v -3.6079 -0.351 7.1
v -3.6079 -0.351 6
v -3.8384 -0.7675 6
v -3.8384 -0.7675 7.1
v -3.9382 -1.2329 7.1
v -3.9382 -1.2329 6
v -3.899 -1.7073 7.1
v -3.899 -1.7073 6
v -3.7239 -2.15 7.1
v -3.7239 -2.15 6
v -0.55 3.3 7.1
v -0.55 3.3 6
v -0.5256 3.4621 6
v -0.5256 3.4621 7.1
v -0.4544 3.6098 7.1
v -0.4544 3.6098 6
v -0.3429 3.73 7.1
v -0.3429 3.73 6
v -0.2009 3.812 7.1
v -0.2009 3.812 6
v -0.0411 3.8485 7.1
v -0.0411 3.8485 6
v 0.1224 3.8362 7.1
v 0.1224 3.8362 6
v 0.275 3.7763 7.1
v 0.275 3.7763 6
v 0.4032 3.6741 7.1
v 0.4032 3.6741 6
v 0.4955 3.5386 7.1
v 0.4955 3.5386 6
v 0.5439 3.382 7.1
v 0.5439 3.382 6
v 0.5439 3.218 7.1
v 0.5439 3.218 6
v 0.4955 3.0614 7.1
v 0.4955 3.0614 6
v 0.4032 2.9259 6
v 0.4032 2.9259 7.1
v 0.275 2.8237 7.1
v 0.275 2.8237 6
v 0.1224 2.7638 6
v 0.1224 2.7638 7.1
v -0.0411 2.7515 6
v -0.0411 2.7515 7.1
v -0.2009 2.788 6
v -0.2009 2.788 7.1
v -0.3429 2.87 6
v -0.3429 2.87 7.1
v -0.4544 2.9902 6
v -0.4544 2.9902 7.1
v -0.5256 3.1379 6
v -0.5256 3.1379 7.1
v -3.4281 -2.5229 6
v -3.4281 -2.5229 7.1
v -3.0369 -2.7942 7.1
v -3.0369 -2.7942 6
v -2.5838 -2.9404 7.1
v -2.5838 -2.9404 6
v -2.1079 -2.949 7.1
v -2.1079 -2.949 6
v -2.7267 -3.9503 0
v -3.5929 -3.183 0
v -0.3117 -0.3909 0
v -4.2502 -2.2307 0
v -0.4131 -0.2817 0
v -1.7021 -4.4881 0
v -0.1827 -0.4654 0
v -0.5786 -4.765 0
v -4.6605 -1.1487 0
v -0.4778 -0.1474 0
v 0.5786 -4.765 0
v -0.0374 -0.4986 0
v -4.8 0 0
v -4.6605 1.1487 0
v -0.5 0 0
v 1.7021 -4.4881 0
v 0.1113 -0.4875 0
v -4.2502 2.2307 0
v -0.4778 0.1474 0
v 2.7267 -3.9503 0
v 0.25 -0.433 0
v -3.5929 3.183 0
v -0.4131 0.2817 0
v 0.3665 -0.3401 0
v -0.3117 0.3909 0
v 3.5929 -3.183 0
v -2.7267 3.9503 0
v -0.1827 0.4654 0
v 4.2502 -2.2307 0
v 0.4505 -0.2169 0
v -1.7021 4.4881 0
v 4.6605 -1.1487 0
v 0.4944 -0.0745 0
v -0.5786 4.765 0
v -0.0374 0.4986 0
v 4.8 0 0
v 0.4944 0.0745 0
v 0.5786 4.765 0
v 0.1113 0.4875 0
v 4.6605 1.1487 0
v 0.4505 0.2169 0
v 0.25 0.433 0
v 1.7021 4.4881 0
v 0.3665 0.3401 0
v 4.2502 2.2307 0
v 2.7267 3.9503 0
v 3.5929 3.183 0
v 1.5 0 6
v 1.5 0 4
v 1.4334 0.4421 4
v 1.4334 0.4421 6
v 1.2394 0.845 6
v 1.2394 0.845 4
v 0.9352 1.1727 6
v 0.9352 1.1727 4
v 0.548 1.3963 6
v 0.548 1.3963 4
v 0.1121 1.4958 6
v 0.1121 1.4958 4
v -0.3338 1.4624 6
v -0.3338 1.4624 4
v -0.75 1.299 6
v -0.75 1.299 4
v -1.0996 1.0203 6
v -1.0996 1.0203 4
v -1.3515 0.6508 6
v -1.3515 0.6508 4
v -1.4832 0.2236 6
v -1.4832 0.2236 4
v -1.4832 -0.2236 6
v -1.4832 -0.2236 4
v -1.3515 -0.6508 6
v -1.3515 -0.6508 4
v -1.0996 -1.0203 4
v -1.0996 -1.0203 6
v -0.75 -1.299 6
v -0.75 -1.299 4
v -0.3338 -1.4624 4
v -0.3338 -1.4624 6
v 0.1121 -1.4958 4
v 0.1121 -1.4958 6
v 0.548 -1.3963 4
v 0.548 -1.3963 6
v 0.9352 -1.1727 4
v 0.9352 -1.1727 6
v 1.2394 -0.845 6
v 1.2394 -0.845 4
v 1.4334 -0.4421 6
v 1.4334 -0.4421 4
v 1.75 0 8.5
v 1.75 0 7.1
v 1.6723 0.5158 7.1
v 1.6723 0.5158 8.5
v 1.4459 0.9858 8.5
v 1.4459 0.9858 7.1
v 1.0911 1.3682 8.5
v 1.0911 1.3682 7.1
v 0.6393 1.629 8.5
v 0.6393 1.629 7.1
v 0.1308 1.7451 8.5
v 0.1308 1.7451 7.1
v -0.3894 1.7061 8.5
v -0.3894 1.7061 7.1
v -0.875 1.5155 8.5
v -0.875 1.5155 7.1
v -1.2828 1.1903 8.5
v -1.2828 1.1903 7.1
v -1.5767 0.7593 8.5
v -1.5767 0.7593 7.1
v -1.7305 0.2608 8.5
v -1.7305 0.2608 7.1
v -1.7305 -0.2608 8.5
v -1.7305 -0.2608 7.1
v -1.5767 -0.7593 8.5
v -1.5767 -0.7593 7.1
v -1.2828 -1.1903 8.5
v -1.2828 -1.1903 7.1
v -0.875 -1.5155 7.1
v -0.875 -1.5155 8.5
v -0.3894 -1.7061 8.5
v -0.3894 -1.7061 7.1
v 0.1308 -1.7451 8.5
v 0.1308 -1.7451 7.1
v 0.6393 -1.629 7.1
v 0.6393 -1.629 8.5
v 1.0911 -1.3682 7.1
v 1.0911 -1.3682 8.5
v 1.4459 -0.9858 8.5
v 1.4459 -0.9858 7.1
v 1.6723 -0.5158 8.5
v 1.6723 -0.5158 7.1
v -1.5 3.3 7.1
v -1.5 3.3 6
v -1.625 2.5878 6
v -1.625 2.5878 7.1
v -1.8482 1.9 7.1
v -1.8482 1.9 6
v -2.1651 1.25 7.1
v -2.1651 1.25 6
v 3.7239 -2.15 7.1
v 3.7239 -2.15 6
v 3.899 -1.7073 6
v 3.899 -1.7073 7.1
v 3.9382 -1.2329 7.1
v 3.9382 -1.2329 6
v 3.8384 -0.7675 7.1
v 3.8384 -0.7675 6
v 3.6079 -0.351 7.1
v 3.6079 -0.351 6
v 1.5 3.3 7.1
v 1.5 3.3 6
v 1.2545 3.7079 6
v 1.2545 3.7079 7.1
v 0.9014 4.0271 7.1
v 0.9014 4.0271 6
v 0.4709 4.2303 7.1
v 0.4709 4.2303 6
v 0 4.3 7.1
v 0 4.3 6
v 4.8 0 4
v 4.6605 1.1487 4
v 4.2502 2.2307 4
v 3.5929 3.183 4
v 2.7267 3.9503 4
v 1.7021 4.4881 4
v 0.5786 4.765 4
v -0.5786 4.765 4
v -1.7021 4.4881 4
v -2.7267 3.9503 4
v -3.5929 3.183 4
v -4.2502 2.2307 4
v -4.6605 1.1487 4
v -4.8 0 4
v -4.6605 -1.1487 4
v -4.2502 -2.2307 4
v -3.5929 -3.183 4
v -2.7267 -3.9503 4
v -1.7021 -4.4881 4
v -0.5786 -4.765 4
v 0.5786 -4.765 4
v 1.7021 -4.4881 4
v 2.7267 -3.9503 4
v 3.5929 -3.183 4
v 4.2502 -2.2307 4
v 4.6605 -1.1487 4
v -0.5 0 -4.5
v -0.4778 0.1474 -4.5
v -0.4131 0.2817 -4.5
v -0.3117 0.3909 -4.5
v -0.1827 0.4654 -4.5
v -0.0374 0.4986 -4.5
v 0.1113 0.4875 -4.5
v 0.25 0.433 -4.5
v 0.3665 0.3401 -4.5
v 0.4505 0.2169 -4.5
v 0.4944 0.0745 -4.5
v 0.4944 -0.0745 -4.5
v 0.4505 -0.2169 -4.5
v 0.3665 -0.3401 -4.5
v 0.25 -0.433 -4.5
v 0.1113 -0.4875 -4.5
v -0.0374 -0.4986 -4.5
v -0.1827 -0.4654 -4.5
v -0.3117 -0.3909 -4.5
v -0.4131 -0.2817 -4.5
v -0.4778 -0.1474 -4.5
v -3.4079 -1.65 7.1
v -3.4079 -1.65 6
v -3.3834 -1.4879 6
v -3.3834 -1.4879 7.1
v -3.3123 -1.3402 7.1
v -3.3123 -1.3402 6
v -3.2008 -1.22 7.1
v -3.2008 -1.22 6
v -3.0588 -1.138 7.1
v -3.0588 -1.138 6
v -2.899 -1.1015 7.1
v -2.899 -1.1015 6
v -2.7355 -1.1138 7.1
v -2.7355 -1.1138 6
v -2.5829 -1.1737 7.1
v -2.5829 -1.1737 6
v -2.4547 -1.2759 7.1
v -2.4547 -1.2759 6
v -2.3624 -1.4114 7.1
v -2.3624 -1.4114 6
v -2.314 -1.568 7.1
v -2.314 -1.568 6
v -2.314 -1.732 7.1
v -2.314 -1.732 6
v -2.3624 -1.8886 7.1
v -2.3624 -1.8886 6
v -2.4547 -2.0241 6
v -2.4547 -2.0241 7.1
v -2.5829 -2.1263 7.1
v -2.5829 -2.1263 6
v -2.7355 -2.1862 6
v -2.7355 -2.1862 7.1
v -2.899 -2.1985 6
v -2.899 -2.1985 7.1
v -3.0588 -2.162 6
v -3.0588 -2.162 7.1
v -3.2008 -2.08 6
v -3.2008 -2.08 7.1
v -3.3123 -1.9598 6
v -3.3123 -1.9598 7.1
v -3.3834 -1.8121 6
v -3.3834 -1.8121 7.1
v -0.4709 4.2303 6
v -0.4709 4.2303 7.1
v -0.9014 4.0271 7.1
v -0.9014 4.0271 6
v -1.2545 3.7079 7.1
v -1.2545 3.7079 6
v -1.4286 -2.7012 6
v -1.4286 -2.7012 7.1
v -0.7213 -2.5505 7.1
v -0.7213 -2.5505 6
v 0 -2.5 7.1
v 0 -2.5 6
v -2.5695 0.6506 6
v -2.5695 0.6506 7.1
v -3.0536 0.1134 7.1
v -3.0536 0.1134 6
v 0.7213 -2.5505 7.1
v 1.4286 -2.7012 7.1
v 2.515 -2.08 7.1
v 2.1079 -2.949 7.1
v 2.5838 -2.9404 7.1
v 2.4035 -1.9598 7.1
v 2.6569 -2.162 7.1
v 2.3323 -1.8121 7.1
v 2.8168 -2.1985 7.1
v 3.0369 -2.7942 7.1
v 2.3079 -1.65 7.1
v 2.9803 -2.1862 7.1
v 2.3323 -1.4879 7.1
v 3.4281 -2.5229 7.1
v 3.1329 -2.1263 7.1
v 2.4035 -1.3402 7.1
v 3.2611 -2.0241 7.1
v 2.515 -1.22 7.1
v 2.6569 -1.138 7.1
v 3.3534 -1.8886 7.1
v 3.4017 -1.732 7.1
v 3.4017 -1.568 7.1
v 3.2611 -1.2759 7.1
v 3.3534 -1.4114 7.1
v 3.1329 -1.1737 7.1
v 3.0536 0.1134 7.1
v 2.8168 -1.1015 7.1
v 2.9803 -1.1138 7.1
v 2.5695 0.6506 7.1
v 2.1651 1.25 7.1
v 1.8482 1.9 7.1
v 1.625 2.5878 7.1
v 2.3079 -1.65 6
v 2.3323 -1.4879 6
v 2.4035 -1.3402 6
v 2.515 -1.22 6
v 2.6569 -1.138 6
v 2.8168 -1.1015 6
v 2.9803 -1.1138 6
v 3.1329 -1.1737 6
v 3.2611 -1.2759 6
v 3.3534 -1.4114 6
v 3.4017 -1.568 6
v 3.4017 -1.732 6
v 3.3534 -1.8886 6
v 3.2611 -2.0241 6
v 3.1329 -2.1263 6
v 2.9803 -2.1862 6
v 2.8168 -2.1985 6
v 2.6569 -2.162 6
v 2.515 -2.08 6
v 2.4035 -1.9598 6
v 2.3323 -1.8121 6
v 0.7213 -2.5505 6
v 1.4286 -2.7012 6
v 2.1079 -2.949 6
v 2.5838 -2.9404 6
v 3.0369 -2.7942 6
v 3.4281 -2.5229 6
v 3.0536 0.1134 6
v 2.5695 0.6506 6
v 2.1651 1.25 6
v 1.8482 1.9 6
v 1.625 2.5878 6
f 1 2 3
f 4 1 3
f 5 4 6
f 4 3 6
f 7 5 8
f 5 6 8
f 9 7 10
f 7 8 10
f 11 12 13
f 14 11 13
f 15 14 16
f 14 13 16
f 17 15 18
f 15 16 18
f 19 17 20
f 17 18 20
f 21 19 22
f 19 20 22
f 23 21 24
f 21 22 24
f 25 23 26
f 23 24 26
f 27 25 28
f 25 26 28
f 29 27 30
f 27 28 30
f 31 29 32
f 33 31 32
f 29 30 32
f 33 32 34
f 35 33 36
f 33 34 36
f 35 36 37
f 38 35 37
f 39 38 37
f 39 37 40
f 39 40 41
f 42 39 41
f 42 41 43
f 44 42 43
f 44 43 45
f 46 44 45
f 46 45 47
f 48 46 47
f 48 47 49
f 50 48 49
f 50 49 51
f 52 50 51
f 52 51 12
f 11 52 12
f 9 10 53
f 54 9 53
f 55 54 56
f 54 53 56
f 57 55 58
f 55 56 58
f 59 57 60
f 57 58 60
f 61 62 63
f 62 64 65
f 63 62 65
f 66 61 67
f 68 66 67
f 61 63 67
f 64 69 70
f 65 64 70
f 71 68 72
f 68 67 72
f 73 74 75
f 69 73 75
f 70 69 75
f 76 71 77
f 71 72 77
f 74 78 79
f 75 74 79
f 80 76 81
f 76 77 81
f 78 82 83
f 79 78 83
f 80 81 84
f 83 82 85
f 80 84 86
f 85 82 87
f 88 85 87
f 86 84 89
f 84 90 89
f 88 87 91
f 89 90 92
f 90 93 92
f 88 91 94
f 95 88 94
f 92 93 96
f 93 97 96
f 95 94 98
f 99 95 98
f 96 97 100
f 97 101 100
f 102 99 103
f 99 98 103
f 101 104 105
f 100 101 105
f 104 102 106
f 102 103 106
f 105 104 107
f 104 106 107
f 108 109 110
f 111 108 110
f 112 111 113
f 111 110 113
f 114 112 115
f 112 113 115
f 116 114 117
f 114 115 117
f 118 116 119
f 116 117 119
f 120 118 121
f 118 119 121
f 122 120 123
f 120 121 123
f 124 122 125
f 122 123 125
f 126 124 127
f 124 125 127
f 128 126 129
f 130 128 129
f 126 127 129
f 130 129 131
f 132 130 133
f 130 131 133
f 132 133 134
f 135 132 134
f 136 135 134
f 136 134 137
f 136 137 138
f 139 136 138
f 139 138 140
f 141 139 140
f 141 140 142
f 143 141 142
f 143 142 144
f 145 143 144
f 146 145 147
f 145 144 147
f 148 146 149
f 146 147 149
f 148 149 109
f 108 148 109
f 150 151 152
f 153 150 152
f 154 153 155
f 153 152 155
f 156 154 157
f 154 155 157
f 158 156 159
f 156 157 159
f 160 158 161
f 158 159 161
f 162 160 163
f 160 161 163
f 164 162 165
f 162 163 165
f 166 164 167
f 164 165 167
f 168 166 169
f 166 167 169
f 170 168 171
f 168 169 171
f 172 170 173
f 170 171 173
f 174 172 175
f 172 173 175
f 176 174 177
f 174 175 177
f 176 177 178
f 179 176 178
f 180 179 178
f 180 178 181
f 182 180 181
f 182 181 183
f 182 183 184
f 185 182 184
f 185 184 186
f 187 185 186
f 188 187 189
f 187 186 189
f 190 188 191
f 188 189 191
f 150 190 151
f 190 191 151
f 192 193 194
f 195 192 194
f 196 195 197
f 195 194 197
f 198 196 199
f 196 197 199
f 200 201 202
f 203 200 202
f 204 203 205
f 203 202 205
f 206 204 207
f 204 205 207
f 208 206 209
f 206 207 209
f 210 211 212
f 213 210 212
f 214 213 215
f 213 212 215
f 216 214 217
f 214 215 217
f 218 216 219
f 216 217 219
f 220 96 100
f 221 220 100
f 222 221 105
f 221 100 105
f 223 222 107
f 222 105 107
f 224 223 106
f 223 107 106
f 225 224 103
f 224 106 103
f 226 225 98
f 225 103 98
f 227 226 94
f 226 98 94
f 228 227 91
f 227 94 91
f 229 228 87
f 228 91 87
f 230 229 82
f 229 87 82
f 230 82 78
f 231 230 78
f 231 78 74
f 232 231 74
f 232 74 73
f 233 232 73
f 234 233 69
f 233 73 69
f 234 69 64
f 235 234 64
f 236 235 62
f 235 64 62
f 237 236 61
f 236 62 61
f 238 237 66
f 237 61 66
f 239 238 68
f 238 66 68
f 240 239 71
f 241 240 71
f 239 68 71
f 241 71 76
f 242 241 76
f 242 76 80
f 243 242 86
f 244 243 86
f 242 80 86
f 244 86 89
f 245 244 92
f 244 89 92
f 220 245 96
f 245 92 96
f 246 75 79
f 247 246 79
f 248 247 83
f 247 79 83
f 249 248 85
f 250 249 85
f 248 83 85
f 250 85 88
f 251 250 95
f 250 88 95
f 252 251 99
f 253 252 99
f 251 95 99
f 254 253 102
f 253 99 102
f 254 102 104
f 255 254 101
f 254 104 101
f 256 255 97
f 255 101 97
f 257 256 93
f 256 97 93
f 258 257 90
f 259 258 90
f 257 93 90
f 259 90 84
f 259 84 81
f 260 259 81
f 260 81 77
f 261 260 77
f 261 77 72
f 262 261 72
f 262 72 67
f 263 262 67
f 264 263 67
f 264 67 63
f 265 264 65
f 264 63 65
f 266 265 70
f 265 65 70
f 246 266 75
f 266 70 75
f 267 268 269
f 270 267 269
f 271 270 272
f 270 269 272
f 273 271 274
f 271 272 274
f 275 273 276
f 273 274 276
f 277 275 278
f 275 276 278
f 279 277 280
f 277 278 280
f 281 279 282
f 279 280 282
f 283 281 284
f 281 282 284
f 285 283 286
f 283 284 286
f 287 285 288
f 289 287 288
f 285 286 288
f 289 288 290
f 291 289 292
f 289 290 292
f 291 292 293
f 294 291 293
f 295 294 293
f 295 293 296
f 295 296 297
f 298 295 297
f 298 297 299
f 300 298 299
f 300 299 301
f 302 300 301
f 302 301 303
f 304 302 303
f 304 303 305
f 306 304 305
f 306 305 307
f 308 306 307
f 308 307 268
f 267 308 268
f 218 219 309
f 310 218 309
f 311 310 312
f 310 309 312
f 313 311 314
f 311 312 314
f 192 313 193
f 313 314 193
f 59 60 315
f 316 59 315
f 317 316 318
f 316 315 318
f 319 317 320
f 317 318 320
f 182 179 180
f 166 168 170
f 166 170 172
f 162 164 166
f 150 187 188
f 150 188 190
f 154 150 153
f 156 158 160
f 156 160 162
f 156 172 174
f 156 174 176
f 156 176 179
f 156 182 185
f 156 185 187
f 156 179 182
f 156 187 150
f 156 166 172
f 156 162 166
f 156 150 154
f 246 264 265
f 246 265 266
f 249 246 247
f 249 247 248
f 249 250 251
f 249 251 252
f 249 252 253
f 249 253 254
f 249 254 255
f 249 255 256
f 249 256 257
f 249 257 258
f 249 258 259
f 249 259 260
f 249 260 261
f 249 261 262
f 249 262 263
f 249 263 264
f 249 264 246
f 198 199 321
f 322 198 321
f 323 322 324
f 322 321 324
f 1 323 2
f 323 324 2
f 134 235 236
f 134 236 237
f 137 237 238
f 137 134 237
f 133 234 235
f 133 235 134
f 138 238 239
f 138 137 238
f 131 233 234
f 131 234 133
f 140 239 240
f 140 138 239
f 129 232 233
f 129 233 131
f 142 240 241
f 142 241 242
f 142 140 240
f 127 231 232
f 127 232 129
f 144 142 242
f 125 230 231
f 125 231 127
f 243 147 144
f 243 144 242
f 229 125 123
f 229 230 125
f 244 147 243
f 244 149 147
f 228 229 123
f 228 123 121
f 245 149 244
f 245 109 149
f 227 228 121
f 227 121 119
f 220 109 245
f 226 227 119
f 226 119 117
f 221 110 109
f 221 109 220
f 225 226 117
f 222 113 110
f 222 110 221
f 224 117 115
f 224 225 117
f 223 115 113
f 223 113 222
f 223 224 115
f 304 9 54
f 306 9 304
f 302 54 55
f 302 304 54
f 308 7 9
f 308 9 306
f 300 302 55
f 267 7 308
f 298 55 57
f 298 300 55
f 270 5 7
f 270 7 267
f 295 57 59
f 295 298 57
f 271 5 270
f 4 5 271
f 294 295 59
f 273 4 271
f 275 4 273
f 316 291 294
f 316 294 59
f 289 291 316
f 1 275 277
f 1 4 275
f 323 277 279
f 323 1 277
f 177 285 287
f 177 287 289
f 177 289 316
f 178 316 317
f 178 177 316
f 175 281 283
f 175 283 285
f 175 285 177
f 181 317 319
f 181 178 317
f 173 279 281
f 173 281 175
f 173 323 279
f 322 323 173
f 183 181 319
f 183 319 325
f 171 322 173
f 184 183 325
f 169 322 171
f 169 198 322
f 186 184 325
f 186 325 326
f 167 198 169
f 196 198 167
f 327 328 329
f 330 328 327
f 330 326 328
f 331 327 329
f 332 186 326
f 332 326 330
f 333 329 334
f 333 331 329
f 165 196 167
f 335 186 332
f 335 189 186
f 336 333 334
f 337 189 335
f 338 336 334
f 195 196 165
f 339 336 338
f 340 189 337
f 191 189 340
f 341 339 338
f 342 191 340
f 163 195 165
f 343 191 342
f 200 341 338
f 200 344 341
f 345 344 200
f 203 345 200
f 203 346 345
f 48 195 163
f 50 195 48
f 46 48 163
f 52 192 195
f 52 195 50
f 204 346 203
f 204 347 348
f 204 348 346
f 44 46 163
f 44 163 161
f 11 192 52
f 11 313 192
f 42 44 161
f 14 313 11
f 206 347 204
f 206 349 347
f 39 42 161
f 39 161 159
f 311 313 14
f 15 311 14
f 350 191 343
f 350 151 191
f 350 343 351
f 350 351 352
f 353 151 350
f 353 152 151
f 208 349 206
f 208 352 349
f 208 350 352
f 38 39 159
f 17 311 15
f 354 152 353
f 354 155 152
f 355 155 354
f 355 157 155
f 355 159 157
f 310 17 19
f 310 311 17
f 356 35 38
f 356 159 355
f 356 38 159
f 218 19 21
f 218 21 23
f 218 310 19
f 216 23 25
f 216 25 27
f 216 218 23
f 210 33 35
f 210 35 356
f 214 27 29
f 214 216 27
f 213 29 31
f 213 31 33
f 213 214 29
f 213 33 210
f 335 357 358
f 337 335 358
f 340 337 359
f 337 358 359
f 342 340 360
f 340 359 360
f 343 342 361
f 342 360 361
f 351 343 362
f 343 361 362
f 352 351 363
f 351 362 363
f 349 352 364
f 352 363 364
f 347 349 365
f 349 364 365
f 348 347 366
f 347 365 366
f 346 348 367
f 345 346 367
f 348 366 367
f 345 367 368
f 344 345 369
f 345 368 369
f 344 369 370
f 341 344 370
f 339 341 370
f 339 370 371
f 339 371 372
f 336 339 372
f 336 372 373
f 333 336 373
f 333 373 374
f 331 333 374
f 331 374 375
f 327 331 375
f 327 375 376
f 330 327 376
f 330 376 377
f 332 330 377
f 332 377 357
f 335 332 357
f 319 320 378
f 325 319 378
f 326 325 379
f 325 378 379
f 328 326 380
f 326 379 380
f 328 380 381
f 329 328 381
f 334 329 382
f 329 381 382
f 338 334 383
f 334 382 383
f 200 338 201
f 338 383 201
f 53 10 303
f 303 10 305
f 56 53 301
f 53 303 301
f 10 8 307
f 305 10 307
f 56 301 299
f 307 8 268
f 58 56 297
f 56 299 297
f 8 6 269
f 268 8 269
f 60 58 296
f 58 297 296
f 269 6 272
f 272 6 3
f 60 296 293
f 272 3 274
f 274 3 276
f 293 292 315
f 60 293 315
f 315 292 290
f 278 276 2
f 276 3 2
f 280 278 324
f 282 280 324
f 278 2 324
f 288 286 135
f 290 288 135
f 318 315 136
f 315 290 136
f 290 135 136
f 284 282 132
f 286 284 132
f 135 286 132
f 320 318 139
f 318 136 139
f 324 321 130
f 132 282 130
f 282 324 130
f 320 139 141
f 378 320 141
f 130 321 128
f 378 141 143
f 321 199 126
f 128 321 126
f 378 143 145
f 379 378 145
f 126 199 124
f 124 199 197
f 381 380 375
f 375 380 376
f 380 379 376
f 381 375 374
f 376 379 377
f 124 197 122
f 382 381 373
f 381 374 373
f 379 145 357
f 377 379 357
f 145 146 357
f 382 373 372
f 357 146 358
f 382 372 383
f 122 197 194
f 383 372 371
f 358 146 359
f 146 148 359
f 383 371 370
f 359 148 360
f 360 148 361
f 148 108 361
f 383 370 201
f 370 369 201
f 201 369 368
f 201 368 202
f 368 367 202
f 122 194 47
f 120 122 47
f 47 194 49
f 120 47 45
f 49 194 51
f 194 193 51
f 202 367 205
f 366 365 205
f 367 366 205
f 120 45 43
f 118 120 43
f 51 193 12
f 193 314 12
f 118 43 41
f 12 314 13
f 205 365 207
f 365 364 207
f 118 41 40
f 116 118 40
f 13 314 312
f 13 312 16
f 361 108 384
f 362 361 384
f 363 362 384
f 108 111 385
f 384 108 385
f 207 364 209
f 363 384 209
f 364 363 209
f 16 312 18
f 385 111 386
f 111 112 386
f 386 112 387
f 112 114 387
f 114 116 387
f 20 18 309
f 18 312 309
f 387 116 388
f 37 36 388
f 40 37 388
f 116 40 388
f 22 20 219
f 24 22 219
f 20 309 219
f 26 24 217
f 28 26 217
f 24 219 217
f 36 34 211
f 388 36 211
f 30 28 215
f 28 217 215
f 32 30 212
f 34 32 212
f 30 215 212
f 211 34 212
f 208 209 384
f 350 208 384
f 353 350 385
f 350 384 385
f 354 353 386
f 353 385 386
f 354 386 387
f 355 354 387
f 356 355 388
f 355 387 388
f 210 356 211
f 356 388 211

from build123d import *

# Parameters (mm, degrees)
SKETCH1_R                   = 4.8
BOSS_EXTRUDE1_DEPTH         = 4
SKETCH3_R                   = 1.5
BOSS_EXTRUDE2_DEPTH         = 2
BOSS_EXTRUDE3_DEPTH         = 1.1
M1_4X0_3_TAPPED_HOLE2_D     = 1.1
M1_4X0_3_TAPPED_HOLE2_DEPTH = 1.1
SKETCH14_R                  = 0.5
BOSS_EXTRUDE4_DEPTH         = 4.5
SKETCH15_R                  = 1.75
BOSS_EXTRUDE5_DEPTH         = 1.4


with BuildPart() as part:
    # Sketch1 → Boss-Extrude1 (new body)
    with BuildSketch(Plane.XY):
        Circle(SKETCH1_R)
    extrude(amount=BOSS_EXTRUDE1_DEPTH)

    # Sketch3 → Boss-Extrude2 (add)
    with BuildSketch(Plane.XY.offset(4)):
        Circle(SKETCH3_R)
    extrude(amount=BOSS_EXTRUDE2_DEPTH)

    # Sketch4 → Boss-Extrude3 (add)
    with BuildSketch(Plane.XY.offset(6)):
        with BuildLine():
            Line((0, 3.3), (0, 2.5))
            ThreePointArc((0, 2.5), (1.250000026, 2.165063495), (2.165063539, 1.249999948))
            ThreePointArc((2.165063539, 1.249999948), (1.724566258, 2.23997367), (1.5, 3.3))
            Line((1.5, 3.3), (0, 3.3))
        make_face()
        with BuildLine():
            Line((0, 4.3), (0, 3.3))
            Line((0, 3.3), (1.5, 3.3))
            ThreePointArc((1.5, 3.3), (0.901387819, 4.027081728), (0, 4.3))
        make_face()
        with BuildLine():
            Line((-1.5, 3.3), (0, 3.3))
            Line((0, 3.3), (0, 4.3))
            ThreePointArc((0, 4.3), (-0.901387819, 4.027081728), (-1.5, 3.3))
        make_face()
        with BuildLine():
            ThreePointArc((-2.165063492, 1.25000003), (-1.249999985, 2.165063518), (0, 2.5))
            Line((0, 2.5), (0, 3.3))
            Line((0, 3.3), (-1.5, 3.3))
            ThreePointArc((-1.5, 3.3), (-1.724566244, 2.239973715), (-2.165063492, 1.25000003))
        make_face()
        with BuildLine():
            ThreePointArc((-1.299038106, 0.75), (-0.75, 1.299038106), (0, 1.5))
            Line((0, 1.5), (0, 2.5))
            ThreePointArc((0, 2.5), (-1.249999985, 2.165063518), (-2.165063492, 1.25000003))
            ThreePointArc((-2.165063492, 1.25000003), (-2.5, 1.7e-08), (-2.165063509, -1.25))
            Line((-2.165063509, -1.25), (-1.299038106, -0.75))
            ThreePointArc((-1.299038106, -0.75), (-1.5, 0), (-1.299038106, 0.75))
        make_face()
        with BuildLine():
            Line((0, 2.5), (0, 1.5))
            ThreePointArc((0, 1.5), (0.75, 1.299038106), (1.299038106, 0.75))
            ThreePointArc((1.299038106, 0.75), (1.448888739, 0.388228568), (1.5, 0))
            ThreePointArc((1.5, 0), (1.448888739, -0.388228568), (1.299038106, -0.75))
            Line((1.299038106, -0.75), (2.165063509, -1.25))
            ThreePointArc((2.165063509, -1.25), (2.414814566, -0.647047613), (2.5, 0))
            ThreePointArc((2.5, 0), (2.414814573, 0.647047584), (2.165063539, 1.249999948))
            ThreePointArc((2.165063539, 1.249999948), (1.250000026, 2.165063495), (0, 2.5))
        make_face()
        with BuildLine():
            Line((1.299038106, 0.75), (0, 0))
            Line((0, 0), (1.299038106, -0.75))
            ThreePointArc((1.299038106, -0.75), (1.448888739, -0.388228568), (1.5, 0))
            ThreePointArc((1.5, 0), (1.448888739, 0.388228568), (1.299038106, 0.75))
        make_face()
        with BuildLine():
            Line((0, 1.5), (0, 0))
            Line((0, 0), (1.299038106, 0.75))
            ThreePointArc((1.299038106, 0.75), (0.75, 1.299038106), (0, 1.5))
        make_face()
        with BuildLine():
            Line((-1.299038106, 0.75), (0, 0))
            Line((0, 0), (0, 1.5))
            ThreePointArc((0, 1.5), (-0.75, 1.299038106), (-1.299038106, 0.75))
        make_face()
        with BuildLine():
            Line((-1.299038106, -0.75), (0, 0))
            Line((0, 0), (-1.299038106, 0.75))
            ThreePointArc((-1.299038106, 0.75), (-1.5, 0), (-1.299038106, -0.75))
        make_face()
        with BuildLine():
            Line((0, -1.5), (0, 0))
            Line((0, 0), (-1.299038106, -0.75))
            ThreePointArc((-1.299038106, -0.75), (-0.75, -1.299038106), (0, -1.5))
        make_face()
        with BuildLine():
            Line((1.299038106, -0.75), (0, 0))
            Line((0, 0), (0, -1.5))
            ThreePointArc((0, -1.5), (0.75, -1.299038106), (1.299038106, -0.75))
        make_face()
        with BuildLine():
            ThreePointArc((0, -1.5), (-0.75, -1.299038106), (-1.299038106, -0.75))
            Line((-1.299038106, -0.75), (-2.165063509, -1.25))
            ThreePointArc((-2.165063509, -1.25), (-1.25, -2.165063509), (0, -2.5))
            ThreePointArc((0, -2.5), (1.25, -2.165063509), (2.165063509, -1.25))
            Line((2.165063509, -1.25), (1.299038106, -0.75))
            ThreePointArc((1.299038106, -0.75), (0.75, -1.299038106), (0, -1.5))
        make_face()
        with BuildLine():
            ThreePointArc((2.5, 0), (2.414814566, -0.647047613), (2.165063509, -1.25))
            Line((2.165063509, -1.25), (2.857883832, -1.65))
            Line((2.857883832, -1.65), (3.607883832, -0.350961894))
            ThreePointArc((3.607883832, -0.350961894), (2.802157271, 0.373531311), (2.165063539, 1.249999948))
            ThreePointArc((2.165063539, 1.249999948), (2.414814573, 0.647047584), (2.5, 0))
        make_face()
        with BuildLine():
            Line((2.857883832, -1.65), (2.165063509, -1.25))
            ThreePointArc((2.165063509, -1.25), (1.25, -2.165063509), (0, -2.5))
            ThreePointArc((0, -2.5), (1.077591002, -2.613505032), (2.107883832, -2.949038106))
            Line((2.107883832, -2.949038106), (2.857883832, -1.65))
        make_face()
        with BuildLine():
            ThreePointArc((0, -2.5), (-1.25, -2.165063509), (-2.165063509, -1.25))
            Line((-2.165063509, -1.25), (-2.857883832, -1.65))
            Line((-2.857883832, -1.65), (-2.107883832, -2.949038106))
            ThreePointArc((-2.107883832, -2.949038106), (-1.077591002, -2.613505032), (0, -2.5))
        make_face()
        with BuildLine():
            Line((-2.857883832, -1.65), (-2.165063509, -1.25))
            ThreePointArc((-2.165063509, -1.25), (-2.5, 1.7e-08), (-2.165063492, 1.25000003))
            ThreePointArc((-2.165063492, 1.25000003), (-2.80215724, 0.373531346), (-3.607883832, -0.350961894))
            Line((-3.607883832, -0.350961894), (-2.857883832, -1.65))
        make_face()
        with BuildLine():
            Line((-3.723909236, -2.15), (-2.857883832, -1.65))
            Line((-2.857883832, -1.65), (-3.607883832, -0.350961894))
            ThreePointArc((-3.607883832, -0.350961894), (-3.938248989, -1.232916114), (-3.723909236, -2.15))
        make_face()
        with BuildLine():
            Line((-2.107883832, -2.949038106), (-2.857883832, -1.65))
            Line((-2.857883832, -1.65), (-3.723909236, -2.15))
            ThreePointArc((-3.723909236, -2.15), (-3.03686117, -2.794165614), (-2.107883832, -2.949038106))
        make_face()
        with BuildLine():
            Line((3.723909236, -2.15), (2.857883832, -1.65))
            Line((2.857883832, -1.65), (2.107883832, -2.949038106))
            ThreePointArc((2.107883832, -2.949038106), (3.03686117, -2.794165614), (3.723909236, -2.15))
        make_face()
        with BuildLine():
            Line((3.607883832, -0.350961894), (2.857883832, -1.65))
            Line((2.857883832, -1.65), (3.723909236, -2.15))
            ThreePointArc((3.723909236, -2.15), (3.938248989, -1.232916114), (3.607883832, -0.350961894))
        make_face()
    extrude(amount=BOSS_EXTRUDE3_DEPTH)

    # M1.4x0.3 Tapped Hole2
    with Locations(Plane.XY.offset(7.1)):
        with Locations((2.857884156, -1.649999841), (-2.85788391, -1.649999841), (0, 3.300000228)):
            Hole(M1_4X0_3_TAPPED_HOLE2_D / 2, depth=M1_4X0_3_TAPPED_HOLE2_DEPTH)

    # Sketch14 → Boss-Extrude4 (add)
    with BuildSketch(Plane(origin=(0, 0, 0), x_dir=(-1, 0, 0), z_dir=(0, 0, -1))):
        Circle(SKETCH14_R)
    extrude(amount=BOSS_EXTRUDE4_DEPTH)

    # Sketch15 → Boss-Extrude5 (add)
    with BuildSketch(Plane.XY.offset(7.1)):
        Circle(SKETCH15_R)
    extrude(amount=BOSS_EXTRUDE5_DEPTH)


solid = part.part
